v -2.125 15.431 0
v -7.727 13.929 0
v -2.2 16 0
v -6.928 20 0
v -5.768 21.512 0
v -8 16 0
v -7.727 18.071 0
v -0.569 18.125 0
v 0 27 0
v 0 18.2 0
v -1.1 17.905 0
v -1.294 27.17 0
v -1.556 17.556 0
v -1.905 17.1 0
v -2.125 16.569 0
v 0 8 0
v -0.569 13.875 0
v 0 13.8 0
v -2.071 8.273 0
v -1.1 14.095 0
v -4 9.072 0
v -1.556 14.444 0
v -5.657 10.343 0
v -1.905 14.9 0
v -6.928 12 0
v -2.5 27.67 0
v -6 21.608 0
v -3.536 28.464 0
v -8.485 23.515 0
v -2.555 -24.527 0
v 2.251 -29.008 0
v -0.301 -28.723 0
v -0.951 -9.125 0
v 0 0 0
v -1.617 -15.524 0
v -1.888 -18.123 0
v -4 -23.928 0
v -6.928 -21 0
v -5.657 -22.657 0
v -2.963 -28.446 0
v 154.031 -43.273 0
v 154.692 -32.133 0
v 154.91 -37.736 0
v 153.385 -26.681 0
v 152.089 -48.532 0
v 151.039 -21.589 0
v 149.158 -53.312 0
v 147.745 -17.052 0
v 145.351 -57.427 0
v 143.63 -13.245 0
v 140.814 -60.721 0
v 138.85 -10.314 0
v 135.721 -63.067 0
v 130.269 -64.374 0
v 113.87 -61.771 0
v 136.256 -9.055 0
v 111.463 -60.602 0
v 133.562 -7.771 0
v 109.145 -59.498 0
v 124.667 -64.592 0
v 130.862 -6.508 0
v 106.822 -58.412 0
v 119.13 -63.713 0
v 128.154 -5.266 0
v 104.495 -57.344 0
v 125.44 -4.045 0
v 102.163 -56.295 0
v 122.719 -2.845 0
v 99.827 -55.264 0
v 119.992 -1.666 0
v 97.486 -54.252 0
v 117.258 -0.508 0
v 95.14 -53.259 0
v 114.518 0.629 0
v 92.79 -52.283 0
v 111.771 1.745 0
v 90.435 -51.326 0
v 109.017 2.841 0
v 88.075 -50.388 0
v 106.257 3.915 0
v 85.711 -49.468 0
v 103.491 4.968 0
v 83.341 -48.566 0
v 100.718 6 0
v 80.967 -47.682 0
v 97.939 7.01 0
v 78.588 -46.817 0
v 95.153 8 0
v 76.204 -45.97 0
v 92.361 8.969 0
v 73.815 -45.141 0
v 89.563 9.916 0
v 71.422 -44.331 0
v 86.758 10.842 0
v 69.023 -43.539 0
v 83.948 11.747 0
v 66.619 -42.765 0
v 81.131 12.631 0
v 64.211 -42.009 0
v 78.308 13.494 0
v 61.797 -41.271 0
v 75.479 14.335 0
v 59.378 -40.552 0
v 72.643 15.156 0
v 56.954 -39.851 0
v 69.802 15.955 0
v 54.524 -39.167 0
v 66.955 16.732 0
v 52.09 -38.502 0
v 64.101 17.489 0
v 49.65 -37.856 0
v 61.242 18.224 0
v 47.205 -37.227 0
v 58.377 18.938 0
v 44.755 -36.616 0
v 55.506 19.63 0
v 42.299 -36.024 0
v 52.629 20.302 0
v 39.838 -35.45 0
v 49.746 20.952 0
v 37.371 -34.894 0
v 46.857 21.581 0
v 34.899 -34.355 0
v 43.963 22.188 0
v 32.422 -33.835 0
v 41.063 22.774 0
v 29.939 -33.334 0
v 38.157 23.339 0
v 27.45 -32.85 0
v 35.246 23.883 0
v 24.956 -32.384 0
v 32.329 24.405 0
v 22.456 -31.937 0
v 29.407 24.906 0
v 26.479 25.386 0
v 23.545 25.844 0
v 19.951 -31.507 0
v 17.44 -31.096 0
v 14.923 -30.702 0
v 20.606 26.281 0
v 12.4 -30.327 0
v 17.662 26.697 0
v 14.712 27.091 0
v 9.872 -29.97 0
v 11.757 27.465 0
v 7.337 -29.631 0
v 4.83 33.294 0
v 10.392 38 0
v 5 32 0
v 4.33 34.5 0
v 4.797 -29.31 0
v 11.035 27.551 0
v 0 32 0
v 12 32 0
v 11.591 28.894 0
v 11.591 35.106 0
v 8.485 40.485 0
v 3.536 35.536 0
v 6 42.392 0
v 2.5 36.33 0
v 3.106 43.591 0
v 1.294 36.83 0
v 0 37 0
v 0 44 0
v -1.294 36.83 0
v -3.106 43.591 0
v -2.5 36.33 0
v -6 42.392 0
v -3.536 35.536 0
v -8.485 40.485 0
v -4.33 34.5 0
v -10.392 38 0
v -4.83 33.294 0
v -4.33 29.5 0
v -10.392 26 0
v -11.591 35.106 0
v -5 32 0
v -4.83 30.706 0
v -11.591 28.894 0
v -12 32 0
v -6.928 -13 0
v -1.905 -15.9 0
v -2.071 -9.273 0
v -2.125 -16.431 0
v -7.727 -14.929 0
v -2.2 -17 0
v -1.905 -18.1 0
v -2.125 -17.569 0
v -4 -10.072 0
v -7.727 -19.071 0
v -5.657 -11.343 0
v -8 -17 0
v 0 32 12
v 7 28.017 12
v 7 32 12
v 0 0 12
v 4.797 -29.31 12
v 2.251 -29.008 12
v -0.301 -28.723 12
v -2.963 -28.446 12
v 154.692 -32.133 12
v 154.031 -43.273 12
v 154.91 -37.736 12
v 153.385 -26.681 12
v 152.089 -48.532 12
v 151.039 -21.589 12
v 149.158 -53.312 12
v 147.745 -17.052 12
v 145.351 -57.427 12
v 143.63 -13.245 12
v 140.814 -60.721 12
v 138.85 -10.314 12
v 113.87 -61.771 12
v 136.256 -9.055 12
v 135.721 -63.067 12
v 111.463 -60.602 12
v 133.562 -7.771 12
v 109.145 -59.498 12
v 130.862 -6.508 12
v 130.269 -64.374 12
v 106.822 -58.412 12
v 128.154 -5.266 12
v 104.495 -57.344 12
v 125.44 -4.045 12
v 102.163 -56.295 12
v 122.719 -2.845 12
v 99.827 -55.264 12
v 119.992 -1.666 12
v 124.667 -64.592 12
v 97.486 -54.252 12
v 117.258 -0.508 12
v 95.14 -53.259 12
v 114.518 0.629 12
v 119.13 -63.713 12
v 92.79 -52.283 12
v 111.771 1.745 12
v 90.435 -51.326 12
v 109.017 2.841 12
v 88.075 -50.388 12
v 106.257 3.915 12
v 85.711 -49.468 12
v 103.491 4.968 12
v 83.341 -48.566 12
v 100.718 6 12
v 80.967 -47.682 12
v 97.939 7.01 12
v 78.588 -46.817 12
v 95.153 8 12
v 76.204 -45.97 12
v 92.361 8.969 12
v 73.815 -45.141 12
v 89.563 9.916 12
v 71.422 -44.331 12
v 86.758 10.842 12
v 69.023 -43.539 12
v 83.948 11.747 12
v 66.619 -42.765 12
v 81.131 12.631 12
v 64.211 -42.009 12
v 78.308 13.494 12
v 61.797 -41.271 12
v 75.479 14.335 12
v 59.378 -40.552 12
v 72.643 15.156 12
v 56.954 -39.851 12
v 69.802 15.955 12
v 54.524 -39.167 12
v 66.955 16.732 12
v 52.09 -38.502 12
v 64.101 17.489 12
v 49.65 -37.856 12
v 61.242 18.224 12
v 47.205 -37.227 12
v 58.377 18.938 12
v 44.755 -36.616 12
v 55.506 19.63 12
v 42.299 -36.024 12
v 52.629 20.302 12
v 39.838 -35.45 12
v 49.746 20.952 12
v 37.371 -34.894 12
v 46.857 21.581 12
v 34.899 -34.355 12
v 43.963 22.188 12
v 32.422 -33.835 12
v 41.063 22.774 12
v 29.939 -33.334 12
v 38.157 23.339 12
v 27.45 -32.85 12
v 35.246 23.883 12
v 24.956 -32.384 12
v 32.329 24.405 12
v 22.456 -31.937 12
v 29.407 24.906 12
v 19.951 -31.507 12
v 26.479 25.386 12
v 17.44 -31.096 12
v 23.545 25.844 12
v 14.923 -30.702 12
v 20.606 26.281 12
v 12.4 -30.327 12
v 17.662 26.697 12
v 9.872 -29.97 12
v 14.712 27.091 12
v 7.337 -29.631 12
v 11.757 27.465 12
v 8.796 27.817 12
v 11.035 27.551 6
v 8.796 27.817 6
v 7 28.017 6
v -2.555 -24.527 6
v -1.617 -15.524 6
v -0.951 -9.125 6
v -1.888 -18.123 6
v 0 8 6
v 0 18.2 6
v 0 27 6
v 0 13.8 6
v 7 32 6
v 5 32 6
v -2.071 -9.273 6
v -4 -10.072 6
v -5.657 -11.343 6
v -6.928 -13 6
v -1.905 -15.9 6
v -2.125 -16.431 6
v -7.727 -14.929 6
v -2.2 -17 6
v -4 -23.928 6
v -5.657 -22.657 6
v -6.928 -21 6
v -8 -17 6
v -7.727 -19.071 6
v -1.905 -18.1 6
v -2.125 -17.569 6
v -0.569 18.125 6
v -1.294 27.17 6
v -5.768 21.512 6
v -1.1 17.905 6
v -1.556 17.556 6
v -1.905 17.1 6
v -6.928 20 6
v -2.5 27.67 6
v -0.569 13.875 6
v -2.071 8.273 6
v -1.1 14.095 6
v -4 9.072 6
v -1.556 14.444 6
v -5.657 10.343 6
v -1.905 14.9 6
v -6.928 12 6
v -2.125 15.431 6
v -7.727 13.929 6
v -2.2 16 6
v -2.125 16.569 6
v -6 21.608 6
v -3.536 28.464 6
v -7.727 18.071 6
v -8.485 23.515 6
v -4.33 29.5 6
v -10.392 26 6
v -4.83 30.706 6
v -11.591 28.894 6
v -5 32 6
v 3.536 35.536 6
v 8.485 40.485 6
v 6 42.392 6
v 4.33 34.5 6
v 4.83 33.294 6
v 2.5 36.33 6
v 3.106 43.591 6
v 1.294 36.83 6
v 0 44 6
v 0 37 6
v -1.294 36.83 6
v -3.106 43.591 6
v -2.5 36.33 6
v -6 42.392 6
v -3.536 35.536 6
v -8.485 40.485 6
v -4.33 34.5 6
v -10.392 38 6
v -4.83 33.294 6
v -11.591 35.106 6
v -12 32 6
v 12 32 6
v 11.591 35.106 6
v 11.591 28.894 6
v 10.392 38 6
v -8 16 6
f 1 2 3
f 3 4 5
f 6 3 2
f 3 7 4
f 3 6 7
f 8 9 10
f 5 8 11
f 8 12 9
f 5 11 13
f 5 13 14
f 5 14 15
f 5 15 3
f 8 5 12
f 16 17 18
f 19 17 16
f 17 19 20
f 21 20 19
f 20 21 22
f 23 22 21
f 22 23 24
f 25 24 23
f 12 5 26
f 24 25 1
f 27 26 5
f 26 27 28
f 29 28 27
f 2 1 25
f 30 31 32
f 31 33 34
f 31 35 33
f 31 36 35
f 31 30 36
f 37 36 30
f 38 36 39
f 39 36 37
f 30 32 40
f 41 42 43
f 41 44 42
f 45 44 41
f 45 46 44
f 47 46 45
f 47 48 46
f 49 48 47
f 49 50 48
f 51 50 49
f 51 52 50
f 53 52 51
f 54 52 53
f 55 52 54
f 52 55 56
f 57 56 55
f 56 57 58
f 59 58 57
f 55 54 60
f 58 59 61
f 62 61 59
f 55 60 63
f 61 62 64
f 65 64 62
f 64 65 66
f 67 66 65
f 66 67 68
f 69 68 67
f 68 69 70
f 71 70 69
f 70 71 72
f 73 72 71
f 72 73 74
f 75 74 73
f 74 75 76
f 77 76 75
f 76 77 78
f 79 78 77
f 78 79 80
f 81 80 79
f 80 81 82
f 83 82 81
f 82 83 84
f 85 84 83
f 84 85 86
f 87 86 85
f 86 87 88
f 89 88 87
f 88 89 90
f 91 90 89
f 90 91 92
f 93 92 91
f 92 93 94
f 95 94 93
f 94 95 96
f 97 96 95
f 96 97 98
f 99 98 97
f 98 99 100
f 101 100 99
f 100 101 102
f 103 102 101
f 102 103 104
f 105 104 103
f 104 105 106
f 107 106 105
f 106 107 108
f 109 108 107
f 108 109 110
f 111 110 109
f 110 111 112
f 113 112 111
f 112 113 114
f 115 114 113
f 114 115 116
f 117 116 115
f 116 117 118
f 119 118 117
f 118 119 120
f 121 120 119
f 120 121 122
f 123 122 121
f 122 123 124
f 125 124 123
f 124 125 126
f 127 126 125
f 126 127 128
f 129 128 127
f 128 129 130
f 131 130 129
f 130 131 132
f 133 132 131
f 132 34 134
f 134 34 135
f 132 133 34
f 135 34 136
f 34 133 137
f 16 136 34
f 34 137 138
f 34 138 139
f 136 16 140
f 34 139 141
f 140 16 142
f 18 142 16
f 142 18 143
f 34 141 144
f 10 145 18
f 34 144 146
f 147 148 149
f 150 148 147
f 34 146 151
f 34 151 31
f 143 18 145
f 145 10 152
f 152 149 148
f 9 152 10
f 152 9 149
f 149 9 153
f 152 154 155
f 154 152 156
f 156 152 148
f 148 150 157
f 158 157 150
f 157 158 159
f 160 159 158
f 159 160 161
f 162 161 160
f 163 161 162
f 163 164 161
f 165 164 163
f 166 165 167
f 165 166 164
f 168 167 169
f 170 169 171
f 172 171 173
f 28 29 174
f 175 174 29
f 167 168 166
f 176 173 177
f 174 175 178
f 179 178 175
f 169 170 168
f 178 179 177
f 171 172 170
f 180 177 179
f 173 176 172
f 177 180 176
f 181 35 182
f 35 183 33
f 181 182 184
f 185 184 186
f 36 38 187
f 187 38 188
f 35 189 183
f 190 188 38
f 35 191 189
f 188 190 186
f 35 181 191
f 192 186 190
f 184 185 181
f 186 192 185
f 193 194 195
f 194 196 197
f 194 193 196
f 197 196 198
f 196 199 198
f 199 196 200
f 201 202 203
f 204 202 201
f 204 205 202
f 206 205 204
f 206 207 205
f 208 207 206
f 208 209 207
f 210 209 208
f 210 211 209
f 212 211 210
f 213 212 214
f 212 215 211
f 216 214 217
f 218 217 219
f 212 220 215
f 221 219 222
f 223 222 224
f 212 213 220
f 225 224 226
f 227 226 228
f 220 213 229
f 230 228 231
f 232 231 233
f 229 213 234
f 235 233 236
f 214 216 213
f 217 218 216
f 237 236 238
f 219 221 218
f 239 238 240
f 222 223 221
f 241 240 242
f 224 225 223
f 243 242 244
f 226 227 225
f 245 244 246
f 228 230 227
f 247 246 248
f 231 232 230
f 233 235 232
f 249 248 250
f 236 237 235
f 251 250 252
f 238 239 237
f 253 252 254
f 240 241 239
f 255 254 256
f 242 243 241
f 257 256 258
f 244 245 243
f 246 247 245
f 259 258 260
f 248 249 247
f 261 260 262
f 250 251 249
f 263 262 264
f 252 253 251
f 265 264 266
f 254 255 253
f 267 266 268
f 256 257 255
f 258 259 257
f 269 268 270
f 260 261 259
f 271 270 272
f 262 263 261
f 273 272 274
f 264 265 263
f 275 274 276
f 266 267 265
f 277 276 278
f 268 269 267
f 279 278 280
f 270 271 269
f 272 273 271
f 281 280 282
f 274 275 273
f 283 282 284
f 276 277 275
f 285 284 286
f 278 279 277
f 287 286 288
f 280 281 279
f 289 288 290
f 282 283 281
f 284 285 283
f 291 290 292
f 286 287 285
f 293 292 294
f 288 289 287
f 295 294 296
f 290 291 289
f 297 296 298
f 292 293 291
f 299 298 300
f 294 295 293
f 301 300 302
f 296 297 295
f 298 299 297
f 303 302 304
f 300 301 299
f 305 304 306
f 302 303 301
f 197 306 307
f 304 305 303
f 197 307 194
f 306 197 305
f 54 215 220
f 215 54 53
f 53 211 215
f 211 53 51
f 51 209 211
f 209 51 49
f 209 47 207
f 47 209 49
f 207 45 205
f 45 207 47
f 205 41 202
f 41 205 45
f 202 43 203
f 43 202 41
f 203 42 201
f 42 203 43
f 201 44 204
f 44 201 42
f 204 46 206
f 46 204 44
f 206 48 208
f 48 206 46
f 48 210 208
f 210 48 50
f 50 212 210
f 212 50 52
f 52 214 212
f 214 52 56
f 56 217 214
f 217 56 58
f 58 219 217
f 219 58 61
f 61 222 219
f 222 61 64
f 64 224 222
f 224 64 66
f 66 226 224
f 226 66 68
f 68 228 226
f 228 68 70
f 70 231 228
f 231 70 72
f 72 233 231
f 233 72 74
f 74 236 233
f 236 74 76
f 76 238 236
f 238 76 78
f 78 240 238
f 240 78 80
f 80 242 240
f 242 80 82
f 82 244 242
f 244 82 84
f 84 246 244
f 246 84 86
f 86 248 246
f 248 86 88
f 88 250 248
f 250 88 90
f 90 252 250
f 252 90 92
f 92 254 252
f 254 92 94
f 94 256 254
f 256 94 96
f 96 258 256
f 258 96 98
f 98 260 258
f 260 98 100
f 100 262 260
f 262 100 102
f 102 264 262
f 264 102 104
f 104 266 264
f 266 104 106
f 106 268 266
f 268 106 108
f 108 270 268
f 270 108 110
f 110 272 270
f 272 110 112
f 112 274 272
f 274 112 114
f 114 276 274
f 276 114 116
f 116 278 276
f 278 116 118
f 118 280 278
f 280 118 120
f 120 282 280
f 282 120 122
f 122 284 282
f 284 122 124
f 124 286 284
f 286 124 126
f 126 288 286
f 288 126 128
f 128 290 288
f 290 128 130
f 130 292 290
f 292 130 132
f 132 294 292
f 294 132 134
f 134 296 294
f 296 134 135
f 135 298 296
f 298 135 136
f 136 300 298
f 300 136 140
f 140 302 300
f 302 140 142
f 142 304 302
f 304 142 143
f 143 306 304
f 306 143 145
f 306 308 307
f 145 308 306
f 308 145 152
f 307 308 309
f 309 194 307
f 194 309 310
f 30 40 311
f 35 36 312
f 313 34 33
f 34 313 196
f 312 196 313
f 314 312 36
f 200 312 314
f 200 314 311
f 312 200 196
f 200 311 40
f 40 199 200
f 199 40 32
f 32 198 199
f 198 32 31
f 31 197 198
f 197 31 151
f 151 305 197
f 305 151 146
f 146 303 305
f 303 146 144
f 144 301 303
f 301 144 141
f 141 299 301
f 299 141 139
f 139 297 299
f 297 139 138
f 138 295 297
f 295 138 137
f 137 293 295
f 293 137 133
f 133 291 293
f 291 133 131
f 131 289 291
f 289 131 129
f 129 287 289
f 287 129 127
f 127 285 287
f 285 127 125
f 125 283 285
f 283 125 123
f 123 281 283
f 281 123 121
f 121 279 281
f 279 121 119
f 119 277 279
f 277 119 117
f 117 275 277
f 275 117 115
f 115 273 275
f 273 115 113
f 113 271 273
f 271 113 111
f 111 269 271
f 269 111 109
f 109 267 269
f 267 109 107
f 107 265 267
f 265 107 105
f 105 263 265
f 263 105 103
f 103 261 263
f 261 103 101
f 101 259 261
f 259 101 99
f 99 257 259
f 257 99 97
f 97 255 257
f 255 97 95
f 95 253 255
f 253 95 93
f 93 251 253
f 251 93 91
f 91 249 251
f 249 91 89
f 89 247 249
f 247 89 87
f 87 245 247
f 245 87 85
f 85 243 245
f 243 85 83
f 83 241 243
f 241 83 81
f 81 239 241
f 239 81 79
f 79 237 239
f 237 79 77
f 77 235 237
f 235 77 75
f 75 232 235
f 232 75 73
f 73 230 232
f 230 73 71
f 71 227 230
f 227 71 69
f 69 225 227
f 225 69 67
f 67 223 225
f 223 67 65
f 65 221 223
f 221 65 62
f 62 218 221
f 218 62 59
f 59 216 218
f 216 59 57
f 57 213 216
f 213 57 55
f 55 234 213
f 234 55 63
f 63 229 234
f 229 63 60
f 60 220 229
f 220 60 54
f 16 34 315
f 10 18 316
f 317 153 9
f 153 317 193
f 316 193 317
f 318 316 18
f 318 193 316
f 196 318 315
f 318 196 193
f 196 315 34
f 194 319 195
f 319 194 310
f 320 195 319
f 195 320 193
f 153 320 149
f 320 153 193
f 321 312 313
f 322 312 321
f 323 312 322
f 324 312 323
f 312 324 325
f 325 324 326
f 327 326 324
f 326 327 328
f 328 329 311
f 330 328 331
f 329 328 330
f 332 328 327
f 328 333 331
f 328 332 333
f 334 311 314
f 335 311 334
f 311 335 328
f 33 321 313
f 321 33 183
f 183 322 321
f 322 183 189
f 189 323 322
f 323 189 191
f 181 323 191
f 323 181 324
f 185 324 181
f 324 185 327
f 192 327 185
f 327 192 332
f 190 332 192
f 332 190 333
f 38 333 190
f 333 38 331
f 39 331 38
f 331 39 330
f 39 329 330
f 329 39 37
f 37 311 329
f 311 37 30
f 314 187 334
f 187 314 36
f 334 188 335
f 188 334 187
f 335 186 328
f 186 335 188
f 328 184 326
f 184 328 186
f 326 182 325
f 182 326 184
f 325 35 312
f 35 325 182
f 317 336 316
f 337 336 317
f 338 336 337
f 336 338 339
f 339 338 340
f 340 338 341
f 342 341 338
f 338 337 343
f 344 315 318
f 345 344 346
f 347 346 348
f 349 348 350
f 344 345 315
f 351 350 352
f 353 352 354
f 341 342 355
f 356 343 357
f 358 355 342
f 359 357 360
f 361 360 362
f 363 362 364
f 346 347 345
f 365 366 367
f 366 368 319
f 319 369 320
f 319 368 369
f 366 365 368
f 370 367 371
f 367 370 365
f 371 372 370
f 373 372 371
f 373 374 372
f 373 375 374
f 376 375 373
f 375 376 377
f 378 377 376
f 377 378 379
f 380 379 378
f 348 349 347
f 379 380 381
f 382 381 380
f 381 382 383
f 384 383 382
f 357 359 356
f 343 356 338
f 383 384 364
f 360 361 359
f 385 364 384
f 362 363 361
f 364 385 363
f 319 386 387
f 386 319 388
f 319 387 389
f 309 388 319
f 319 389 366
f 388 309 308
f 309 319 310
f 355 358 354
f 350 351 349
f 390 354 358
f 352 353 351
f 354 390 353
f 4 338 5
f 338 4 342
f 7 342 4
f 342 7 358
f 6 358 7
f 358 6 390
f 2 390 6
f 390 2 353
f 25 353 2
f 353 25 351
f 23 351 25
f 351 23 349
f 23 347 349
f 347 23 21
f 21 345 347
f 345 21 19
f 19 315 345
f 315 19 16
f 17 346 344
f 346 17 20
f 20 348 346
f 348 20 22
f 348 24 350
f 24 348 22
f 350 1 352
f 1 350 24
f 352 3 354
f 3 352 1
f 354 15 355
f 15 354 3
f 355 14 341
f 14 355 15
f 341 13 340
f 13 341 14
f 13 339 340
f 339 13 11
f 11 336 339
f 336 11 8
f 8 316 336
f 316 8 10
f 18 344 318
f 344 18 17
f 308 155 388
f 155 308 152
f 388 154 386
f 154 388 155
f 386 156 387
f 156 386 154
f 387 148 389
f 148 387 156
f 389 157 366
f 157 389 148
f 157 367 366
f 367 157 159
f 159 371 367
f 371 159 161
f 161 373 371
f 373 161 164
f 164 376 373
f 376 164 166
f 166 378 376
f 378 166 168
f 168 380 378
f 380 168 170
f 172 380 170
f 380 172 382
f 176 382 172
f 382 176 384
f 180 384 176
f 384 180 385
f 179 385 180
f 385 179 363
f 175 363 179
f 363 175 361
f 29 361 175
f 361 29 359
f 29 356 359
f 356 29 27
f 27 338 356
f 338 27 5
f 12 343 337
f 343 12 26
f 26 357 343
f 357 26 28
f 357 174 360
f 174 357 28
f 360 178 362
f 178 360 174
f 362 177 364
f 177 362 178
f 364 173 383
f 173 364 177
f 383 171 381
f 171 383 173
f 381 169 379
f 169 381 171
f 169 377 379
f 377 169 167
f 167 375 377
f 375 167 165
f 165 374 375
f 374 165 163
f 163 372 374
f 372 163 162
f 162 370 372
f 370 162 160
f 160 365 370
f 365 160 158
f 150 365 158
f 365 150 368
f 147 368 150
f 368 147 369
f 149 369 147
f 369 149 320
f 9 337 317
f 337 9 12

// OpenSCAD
// hanger-split: half w16 w=16 cm slope=15.92 deg bow=0.59 cm r=2.86 cm depth=12.0 mm
// Print this half twice, flat. Turn the second half 180 degrees about the vertical axis, lay the
// bosses together and clamp with two M4 bolts through the 4.4 mm holes.
// Generated by hanger_split.split.scad; not rendered in this run (no OpenSCAD in the image).
depth = 12.0;
union() {
  linear_extrude(height = 12) polygon([[2.963, 28.446], [5.830, 28.147], [8.796, 27.817], [11.757, 27.465], [14.712, 27.091], [17.662, 26.697], [20.606, 26.281], [23.545, 25.844], [26.479, 25.386], [29.407, 24.906], [32.329, 24.405], [35.246, 23.883], [38.157, 23.339], [41.063, 22.774], [43.963, 22.188], [46.857, 21.581], [49.746, 20.952], [52.629, 20.302], [55.506, 19.630], [58.377, 18.938], [61.242, 18.224], [64.101, 17.489], [66.955, 16.732], [69.802, 15.955], [72.643, 15.156], [75.479, 14.335], [78.308, 13.494], [81.131, 12.631], [83.948, 11.747], [86.758, 10.842], [89.563, 9.916], [92.361, 8.969], [95.153, 8.000], [97.939, 7.010], [100.718, 6.000], [103.491, 4.968], [106.257, 3.915], [109.017, 2.841], [111.771, 1.745], [114.518, 0.629], [117.258, -0.508], [119.992, -1.666], [122.719, -2.845], [125.440, -4.045], [128.154, -5.266], [130.862, -6.508], [133.562, -7.771], [136.256, -9.055], [138.850, -10.314], [143.630, -13.245], [147.745, -17.052], [151.039, -21.589], [153.385, -26.681], [154.692, -32.133], [154.910, -37.736], [154.031, -43.273], [152.089, -48.532], [149.158, -53.312], [145.351, -57.427], [140.814, -60.721], [135.721, -63.067], [130.269, -64.374], [124.667, -64.592], [119.130, -63.713], [113.870, -61.771], [111.463, -60.602], [109.145, -59.498], [106.822, -58.412], [104.495, -57.344], [102.163, -56.295], [99.827, -55.264], [97.486, -54.252], [95.140, -53.259], [92.790, -52.283], [90.435, -51.326], [88.075, -50.388], [85.711, -49.468], [83.341, -48.566], [80.967, -47.682], [78.588, -46.817], [76.204, -45.970], [73.815, -45.141], [71.422, -44.331], [69.023, -43.539], [66.619, -42.765], [64.211, -42.009], [61.797, -41.271], [59.378, -40.552], [56.954, -39.851], [54.524, -39.167], [52.090, -38.502], [49.650, -37.856], [47.205, -37.227], [44.755, -36.616], [42.299, -36.024], [39.838, -35.450], [37.371, -34.894], [34.899, -34.355], [32.422, -33.835], [29.939, -33.334], [27.450, -32.850], [24.956, -32.384], [22.456, -31.937], [19.951, -31.507], [17.440, -31.096], [14.923, -30.702], [12.400, -30.327], [9.872, -29.970], [7.337, -29.631], [4.797, -29.310], [2.251, -29.008], [-0.301, -28.723], [-2.963, -28.446]]);
  linear_extrude(height = 12) polygon([[0.000, -28.600], [7.402, -27.625], [14.300, -24.768], [20.223, -20.223], [24.768, -14.300], [27.625, -7.402], [28.600, -0.000], [27.625, 7.402], [24.768, 14.300], [20.223, 20.223], [14.300, 24.768], [7.402, 27.625], [0.000, 28.600]]);
  linear_extrude(height = 12) polygon([[0.000, 0.000], [7.000, 0.000], [7.000, 32.000], [0.000, 32.000]]);
  linear_extrude(height = 6) difference() { polygon([[8.000, -17.000], [7.727, -14.929], [6.928, -13.000], [5.657, -11.343], [4.000, -10.072], [2.071, -9.273], [0.000, -9.000], [-2.071, -9.273], [-4.000, -10.072], [-5.657, -11.343], [-6.928, -13.000], [-7.727, -14.929], [-8.000, -17.000], [-7.727, -19.071], [-6.928, -21.000], [-5.657, -22.657], [-4.000, -23.928], [-2.071, -24.727], [-0.000, -25.000], [2.071, -24.727], [4.000, -23.928], [5.657, -22.657], [6.928, -21.000], [7.727, -19.071]]); polygon([[2.200, -17.000], [2.125, -16.431], [1.905, -15.900], [1.556, -15.444], [1.100, -15.095], [0.569, -14.875], [0.000, -14.800], [-0.569, -14.875], [-1.100, -15.095], [-1.556, -15.444], [-1.905, -15.900], [-2.125, -16.431], [-2.200, -17.000], [-2.125, -17.569], [-1.905, -18.100], [-1.556, -18.556], [-1.100, -18.905], [-0.569, -19.125], [-0.000, -19.200], [0.569, -19.125], [1.100, -18.905], [1.556, -18.556], [1.905, -18.100], [2.125, -17.569]]); }
  linear_extrude(height = 6) difference() { polygon([[8.000, 16.000], [7.727, 18.071], [6.928, 20.000], [5.657, 21.657], [4.000, 22.928], [2.071, 23.727], [0.000, 24.000], [-2.071, 23.727], [-4.000, 22.928], [-5.657, 21.657], [-6.928, 20.000], [-7.727, 18.071], [-8.000, 16.000], [-7.727, 13.929], [-6.928, 12.000], [-5.657, 10.343], [-4.000, 9.072], [-2.071, 8.273], [-0.000, 8.000], [2.071, 8.273], [4.000, 9.072], [5.657, 10.343], [6.928, 12.000], [7.727, 13.929]]); polygon([[2.200, 16.000], [2.125, 16.569], [1.905, 17.100], [1.556, 17.556], [1.100, 17.905], [0.569, 18.125], [0.000, 18.200], [-0.569, 18.125], [-1.100, 17.905], [-1.556, 17.556], [-1.905, 17.100], [-2.125, 16.569], [-2.200, 16.000], [-2.125, 15.431], [-1.905, 14.900], [-1.556, 14.444], [-1.100, 14.095], [-0.569, 13.875], [-0.000, 13.800], [0.569, 13.875], [1.100, 14.095], [1.556, 14.444], [1.905, 14.900], [2.125, 15.431]]); }
  linear_extrude(height = 6) difference() { polygon([[12.000, 32.000], [11.591, 35.106], [10.392, 38.000], [8.485, 40.485], [6.000, 42.392], [3.106, 43.591], [0.000, 44.000], [-3.106, 43.591], [-6.000, 42.392], [-8.485, 40.485], [-10.392, 38.000], [-11.591, 35.106], [-12.000, 32.000], [-11.591, 28.894], [-10.392, 26.000], [-8.485, 23.515], [-6.000, 21.608], [-3.106, 20.409], [-0.000, 20.000], [3.106, 20.409], [6.000, 21.608], [8.485, 23.515], [10.392, 26.000], [11.591, 28.894]]); polygon([[5.000, 32.000], [4.830, 33.294], [4.330, 34.500], [3.536, 35.536], [2.500, 36.330], [1.294, 36.830], [0.000, 37.000], [-1.294, 36.830], [-2.500, 36.330], [-3.536, 35.536], [-4.330, 34.500], [-4.830, 33.294], [-5.000, 32.000], [-4.830, 30.706], [-4.330, 29.500], [-3.536, 28.464], [-2.500, 27.670], [-1.294, 27.170], [-0.000, 27.000], [1.294, 27.170], [2.500, 27.670], [3.536, 28.464], [4.330, 29.500], [4.830, 30.706]]); }
}
